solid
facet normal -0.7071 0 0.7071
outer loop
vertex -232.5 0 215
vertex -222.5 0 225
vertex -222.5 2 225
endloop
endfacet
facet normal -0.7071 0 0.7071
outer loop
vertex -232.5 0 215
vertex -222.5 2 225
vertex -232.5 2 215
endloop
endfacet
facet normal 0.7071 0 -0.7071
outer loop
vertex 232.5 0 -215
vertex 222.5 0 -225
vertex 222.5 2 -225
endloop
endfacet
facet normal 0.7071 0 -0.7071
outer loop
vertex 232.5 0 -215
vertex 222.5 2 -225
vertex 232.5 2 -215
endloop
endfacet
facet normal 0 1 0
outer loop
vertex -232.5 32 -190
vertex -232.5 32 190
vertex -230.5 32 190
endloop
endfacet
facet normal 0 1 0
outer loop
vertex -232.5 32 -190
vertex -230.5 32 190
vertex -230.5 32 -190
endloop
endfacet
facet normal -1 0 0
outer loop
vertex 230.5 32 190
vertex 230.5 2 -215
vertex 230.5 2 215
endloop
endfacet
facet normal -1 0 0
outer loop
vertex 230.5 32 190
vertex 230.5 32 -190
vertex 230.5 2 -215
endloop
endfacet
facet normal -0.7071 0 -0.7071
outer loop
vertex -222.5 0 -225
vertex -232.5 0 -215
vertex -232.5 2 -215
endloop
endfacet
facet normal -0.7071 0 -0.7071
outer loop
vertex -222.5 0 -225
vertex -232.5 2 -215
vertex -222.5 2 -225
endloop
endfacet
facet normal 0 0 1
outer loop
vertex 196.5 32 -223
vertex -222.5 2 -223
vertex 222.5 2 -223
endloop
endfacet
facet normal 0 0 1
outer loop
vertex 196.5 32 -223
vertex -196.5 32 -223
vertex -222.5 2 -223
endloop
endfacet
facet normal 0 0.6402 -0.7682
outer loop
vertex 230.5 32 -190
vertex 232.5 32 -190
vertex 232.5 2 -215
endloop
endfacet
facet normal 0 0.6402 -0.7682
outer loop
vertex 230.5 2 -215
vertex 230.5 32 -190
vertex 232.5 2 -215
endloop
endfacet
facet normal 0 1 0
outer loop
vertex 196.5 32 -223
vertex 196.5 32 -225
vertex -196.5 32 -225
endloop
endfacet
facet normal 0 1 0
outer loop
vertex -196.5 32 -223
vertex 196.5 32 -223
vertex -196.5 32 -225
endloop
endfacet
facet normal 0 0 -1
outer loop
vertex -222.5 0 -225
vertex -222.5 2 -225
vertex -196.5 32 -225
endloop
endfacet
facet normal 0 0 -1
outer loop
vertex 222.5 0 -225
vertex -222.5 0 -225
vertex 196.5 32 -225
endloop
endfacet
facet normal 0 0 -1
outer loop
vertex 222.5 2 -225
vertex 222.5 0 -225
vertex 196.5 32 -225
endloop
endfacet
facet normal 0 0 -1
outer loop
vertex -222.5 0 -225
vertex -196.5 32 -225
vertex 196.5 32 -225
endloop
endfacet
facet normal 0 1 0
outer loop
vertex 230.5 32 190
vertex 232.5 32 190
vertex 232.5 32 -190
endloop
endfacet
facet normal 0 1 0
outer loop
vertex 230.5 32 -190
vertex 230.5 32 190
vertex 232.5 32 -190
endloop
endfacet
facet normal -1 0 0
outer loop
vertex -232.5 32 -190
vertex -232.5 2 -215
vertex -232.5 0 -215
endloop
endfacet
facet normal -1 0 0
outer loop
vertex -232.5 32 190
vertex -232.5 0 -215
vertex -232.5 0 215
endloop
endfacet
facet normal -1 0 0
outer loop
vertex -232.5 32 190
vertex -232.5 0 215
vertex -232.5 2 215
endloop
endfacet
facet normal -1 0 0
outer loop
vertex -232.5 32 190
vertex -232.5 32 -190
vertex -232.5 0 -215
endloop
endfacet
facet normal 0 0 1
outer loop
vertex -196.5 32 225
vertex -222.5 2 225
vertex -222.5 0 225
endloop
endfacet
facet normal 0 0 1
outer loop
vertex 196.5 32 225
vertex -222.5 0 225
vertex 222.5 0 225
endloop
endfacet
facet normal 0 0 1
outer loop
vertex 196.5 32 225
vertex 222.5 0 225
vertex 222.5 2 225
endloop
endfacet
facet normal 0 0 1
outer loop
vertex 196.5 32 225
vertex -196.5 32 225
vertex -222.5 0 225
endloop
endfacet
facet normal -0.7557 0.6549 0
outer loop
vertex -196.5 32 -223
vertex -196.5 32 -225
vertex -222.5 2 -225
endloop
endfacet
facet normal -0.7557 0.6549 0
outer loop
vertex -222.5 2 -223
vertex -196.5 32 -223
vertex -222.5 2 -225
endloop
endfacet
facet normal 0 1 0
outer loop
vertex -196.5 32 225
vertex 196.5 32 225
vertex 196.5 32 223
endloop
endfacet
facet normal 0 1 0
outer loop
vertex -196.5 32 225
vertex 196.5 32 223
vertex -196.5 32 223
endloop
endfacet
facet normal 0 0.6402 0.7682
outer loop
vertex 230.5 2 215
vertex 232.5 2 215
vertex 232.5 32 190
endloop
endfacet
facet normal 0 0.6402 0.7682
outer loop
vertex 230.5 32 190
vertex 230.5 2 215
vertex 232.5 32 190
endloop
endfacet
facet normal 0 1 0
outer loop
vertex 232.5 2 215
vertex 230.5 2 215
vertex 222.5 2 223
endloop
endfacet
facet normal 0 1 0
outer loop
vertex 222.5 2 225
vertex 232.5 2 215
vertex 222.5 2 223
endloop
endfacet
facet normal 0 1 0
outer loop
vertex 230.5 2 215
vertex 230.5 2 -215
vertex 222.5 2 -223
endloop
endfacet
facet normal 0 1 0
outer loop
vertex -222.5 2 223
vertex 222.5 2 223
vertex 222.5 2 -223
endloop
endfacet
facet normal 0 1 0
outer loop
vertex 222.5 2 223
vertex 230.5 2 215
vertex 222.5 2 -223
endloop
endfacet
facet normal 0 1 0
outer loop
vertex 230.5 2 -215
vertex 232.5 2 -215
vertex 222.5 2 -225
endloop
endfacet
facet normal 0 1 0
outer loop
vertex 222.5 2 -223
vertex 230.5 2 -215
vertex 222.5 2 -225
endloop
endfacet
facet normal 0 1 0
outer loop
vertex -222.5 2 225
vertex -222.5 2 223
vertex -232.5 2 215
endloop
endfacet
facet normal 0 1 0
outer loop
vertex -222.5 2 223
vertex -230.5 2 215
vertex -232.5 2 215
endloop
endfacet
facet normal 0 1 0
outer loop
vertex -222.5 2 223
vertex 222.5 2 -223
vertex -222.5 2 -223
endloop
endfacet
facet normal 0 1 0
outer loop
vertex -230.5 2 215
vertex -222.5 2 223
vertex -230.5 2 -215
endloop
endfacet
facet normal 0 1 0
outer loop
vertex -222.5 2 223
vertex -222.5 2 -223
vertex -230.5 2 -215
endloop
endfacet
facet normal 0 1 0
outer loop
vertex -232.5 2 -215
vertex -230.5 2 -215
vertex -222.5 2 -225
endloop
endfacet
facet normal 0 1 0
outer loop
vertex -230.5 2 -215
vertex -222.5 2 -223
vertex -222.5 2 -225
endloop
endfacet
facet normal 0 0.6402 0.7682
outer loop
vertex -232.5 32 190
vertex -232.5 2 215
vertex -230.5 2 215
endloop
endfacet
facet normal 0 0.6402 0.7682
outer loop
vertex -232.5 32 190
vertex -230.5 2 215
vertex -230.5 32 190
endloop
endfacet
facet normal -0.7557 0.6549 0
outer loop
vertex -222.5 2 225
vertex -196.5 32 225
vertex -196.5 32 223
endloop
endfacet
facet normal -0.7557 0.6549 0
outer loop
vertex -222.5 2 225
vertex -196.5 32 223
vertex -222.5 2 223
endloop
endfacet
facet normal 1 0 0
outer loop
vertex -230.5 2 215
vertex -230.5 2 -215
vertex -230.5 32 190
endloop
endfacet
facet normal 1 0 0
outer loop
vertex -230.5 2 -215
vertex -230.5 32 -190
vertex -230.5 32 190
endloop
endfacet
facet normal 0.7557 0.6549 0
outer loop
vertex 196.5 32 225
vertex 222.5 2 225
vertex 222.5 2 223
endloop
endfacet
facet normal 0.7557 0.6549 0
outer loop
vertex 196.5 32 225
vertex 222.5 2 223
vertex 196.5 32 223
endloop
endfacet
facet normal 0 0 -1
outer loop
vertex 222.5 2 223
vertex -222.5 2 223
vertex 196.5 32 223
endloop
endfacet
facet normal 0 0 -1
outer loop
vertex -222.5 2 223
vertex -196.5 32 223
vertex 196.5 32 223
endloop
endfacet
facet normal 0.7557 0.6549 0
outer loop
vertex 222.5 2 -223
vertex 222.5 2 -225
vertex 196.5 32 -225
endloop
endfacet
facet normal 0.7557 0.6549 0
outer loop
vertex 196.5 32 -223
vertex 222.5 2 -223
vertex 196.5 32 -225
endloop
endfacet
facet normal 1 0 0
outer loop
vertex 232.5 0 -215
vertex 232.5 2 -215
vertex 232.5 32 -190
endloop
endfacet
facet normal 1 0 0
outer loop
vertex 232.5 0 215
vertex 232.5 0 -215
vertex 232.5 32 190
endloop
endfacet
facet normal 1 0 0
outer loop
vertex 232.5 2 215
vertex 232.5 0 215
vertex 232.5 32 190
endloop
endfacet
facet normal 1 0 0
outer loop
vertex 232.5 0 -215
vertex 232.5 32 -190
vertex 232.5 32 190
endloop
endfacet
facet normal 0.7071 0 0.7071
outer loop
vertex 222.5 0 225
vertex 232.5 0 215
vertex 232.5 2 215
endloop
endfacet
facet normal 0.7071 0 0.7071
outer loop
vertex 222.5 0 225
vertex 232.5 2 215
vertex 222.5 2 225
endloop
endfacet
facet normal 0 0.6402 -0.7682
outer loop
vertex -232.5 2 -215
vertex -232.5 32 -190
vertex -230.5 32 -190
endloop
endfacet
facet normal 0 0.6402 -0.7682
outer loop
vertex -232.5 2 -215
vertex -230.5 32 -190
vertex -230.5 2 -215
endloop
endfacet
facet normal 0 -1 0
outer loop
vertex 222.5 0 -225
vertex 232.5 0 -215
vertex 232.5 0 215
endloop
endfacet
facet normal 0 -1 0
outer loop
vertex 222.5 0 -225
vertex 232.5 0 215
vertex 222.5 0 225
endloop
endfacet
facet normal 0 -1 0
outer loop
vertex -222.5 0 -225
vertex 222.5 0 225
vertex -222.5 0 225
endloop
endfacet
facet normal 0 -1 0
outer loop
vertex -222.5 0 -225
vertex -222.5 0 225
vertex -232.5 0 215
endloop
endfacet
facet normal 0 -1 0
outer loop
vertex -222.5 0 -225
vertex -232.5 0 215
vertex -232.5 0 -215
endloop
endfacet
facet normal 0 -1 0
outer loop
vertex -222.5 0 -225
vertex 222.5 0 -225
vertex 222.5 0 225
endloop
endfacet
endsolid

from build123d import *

# Parameters (mm, degrees)
BOSS_EXTRUDE1_DEPTH = 2
BOSS_EXTRUDE2_DEPTH = 2
BOSS_EXTRUDE3_DEPTH = 2


with BuildPart() as part:
    # Sketch1 → Boss-Extrude1 (new body)
    with BuildSketch(Plane(origin=(0, 0, 0), x_dir=(1, 0, 0), z_dir=(0, 1, 0))):
        Polygon((-232.5, 215), (-222.5, 225), (222.5, 225), (232.5, 215), (232.5, -215), (222.5, -225), (-222.5, -225), (-232.5, -215), align=None)
    extrude(amount=BOSS_EXTRUDE1_DEPTH)

    # Sketch3 → Boss-Extrude2 (add)
    with BuildSketch(Plane.XY.offset(225)):
        Polygon((-222.5, 2), (222.5, 2), (196.5, 32), (-196.5, 32), align=None)
    boss_extrude2 = extrude(amount=-BOSS_EXTRUDE2_DEPTH)

    # Sketch4 → Boss-Extrude3 (add)
    with BuildSketch(Plane.ZY.offset(232.5)):
        Polygon((-215, 2), (215, 2), (190, 32), (-190, 32), align=None)
    boss_extrude3 = extrude(amount=-BOSS_EXTRUDE3_DEPTH)

    # Mirror2: Boss-Extrude3 across plane
    add(boss_extrude3.mirror(Plane(origin=(0, 0, 0), x_dir=(0, 0, 1), z_dir=(1, 0, 0))))

    # Mirror3: Boss-Extrude2 across plane
    add(boss_extrude2.mirror(Plane.XY))


solid = part.part
